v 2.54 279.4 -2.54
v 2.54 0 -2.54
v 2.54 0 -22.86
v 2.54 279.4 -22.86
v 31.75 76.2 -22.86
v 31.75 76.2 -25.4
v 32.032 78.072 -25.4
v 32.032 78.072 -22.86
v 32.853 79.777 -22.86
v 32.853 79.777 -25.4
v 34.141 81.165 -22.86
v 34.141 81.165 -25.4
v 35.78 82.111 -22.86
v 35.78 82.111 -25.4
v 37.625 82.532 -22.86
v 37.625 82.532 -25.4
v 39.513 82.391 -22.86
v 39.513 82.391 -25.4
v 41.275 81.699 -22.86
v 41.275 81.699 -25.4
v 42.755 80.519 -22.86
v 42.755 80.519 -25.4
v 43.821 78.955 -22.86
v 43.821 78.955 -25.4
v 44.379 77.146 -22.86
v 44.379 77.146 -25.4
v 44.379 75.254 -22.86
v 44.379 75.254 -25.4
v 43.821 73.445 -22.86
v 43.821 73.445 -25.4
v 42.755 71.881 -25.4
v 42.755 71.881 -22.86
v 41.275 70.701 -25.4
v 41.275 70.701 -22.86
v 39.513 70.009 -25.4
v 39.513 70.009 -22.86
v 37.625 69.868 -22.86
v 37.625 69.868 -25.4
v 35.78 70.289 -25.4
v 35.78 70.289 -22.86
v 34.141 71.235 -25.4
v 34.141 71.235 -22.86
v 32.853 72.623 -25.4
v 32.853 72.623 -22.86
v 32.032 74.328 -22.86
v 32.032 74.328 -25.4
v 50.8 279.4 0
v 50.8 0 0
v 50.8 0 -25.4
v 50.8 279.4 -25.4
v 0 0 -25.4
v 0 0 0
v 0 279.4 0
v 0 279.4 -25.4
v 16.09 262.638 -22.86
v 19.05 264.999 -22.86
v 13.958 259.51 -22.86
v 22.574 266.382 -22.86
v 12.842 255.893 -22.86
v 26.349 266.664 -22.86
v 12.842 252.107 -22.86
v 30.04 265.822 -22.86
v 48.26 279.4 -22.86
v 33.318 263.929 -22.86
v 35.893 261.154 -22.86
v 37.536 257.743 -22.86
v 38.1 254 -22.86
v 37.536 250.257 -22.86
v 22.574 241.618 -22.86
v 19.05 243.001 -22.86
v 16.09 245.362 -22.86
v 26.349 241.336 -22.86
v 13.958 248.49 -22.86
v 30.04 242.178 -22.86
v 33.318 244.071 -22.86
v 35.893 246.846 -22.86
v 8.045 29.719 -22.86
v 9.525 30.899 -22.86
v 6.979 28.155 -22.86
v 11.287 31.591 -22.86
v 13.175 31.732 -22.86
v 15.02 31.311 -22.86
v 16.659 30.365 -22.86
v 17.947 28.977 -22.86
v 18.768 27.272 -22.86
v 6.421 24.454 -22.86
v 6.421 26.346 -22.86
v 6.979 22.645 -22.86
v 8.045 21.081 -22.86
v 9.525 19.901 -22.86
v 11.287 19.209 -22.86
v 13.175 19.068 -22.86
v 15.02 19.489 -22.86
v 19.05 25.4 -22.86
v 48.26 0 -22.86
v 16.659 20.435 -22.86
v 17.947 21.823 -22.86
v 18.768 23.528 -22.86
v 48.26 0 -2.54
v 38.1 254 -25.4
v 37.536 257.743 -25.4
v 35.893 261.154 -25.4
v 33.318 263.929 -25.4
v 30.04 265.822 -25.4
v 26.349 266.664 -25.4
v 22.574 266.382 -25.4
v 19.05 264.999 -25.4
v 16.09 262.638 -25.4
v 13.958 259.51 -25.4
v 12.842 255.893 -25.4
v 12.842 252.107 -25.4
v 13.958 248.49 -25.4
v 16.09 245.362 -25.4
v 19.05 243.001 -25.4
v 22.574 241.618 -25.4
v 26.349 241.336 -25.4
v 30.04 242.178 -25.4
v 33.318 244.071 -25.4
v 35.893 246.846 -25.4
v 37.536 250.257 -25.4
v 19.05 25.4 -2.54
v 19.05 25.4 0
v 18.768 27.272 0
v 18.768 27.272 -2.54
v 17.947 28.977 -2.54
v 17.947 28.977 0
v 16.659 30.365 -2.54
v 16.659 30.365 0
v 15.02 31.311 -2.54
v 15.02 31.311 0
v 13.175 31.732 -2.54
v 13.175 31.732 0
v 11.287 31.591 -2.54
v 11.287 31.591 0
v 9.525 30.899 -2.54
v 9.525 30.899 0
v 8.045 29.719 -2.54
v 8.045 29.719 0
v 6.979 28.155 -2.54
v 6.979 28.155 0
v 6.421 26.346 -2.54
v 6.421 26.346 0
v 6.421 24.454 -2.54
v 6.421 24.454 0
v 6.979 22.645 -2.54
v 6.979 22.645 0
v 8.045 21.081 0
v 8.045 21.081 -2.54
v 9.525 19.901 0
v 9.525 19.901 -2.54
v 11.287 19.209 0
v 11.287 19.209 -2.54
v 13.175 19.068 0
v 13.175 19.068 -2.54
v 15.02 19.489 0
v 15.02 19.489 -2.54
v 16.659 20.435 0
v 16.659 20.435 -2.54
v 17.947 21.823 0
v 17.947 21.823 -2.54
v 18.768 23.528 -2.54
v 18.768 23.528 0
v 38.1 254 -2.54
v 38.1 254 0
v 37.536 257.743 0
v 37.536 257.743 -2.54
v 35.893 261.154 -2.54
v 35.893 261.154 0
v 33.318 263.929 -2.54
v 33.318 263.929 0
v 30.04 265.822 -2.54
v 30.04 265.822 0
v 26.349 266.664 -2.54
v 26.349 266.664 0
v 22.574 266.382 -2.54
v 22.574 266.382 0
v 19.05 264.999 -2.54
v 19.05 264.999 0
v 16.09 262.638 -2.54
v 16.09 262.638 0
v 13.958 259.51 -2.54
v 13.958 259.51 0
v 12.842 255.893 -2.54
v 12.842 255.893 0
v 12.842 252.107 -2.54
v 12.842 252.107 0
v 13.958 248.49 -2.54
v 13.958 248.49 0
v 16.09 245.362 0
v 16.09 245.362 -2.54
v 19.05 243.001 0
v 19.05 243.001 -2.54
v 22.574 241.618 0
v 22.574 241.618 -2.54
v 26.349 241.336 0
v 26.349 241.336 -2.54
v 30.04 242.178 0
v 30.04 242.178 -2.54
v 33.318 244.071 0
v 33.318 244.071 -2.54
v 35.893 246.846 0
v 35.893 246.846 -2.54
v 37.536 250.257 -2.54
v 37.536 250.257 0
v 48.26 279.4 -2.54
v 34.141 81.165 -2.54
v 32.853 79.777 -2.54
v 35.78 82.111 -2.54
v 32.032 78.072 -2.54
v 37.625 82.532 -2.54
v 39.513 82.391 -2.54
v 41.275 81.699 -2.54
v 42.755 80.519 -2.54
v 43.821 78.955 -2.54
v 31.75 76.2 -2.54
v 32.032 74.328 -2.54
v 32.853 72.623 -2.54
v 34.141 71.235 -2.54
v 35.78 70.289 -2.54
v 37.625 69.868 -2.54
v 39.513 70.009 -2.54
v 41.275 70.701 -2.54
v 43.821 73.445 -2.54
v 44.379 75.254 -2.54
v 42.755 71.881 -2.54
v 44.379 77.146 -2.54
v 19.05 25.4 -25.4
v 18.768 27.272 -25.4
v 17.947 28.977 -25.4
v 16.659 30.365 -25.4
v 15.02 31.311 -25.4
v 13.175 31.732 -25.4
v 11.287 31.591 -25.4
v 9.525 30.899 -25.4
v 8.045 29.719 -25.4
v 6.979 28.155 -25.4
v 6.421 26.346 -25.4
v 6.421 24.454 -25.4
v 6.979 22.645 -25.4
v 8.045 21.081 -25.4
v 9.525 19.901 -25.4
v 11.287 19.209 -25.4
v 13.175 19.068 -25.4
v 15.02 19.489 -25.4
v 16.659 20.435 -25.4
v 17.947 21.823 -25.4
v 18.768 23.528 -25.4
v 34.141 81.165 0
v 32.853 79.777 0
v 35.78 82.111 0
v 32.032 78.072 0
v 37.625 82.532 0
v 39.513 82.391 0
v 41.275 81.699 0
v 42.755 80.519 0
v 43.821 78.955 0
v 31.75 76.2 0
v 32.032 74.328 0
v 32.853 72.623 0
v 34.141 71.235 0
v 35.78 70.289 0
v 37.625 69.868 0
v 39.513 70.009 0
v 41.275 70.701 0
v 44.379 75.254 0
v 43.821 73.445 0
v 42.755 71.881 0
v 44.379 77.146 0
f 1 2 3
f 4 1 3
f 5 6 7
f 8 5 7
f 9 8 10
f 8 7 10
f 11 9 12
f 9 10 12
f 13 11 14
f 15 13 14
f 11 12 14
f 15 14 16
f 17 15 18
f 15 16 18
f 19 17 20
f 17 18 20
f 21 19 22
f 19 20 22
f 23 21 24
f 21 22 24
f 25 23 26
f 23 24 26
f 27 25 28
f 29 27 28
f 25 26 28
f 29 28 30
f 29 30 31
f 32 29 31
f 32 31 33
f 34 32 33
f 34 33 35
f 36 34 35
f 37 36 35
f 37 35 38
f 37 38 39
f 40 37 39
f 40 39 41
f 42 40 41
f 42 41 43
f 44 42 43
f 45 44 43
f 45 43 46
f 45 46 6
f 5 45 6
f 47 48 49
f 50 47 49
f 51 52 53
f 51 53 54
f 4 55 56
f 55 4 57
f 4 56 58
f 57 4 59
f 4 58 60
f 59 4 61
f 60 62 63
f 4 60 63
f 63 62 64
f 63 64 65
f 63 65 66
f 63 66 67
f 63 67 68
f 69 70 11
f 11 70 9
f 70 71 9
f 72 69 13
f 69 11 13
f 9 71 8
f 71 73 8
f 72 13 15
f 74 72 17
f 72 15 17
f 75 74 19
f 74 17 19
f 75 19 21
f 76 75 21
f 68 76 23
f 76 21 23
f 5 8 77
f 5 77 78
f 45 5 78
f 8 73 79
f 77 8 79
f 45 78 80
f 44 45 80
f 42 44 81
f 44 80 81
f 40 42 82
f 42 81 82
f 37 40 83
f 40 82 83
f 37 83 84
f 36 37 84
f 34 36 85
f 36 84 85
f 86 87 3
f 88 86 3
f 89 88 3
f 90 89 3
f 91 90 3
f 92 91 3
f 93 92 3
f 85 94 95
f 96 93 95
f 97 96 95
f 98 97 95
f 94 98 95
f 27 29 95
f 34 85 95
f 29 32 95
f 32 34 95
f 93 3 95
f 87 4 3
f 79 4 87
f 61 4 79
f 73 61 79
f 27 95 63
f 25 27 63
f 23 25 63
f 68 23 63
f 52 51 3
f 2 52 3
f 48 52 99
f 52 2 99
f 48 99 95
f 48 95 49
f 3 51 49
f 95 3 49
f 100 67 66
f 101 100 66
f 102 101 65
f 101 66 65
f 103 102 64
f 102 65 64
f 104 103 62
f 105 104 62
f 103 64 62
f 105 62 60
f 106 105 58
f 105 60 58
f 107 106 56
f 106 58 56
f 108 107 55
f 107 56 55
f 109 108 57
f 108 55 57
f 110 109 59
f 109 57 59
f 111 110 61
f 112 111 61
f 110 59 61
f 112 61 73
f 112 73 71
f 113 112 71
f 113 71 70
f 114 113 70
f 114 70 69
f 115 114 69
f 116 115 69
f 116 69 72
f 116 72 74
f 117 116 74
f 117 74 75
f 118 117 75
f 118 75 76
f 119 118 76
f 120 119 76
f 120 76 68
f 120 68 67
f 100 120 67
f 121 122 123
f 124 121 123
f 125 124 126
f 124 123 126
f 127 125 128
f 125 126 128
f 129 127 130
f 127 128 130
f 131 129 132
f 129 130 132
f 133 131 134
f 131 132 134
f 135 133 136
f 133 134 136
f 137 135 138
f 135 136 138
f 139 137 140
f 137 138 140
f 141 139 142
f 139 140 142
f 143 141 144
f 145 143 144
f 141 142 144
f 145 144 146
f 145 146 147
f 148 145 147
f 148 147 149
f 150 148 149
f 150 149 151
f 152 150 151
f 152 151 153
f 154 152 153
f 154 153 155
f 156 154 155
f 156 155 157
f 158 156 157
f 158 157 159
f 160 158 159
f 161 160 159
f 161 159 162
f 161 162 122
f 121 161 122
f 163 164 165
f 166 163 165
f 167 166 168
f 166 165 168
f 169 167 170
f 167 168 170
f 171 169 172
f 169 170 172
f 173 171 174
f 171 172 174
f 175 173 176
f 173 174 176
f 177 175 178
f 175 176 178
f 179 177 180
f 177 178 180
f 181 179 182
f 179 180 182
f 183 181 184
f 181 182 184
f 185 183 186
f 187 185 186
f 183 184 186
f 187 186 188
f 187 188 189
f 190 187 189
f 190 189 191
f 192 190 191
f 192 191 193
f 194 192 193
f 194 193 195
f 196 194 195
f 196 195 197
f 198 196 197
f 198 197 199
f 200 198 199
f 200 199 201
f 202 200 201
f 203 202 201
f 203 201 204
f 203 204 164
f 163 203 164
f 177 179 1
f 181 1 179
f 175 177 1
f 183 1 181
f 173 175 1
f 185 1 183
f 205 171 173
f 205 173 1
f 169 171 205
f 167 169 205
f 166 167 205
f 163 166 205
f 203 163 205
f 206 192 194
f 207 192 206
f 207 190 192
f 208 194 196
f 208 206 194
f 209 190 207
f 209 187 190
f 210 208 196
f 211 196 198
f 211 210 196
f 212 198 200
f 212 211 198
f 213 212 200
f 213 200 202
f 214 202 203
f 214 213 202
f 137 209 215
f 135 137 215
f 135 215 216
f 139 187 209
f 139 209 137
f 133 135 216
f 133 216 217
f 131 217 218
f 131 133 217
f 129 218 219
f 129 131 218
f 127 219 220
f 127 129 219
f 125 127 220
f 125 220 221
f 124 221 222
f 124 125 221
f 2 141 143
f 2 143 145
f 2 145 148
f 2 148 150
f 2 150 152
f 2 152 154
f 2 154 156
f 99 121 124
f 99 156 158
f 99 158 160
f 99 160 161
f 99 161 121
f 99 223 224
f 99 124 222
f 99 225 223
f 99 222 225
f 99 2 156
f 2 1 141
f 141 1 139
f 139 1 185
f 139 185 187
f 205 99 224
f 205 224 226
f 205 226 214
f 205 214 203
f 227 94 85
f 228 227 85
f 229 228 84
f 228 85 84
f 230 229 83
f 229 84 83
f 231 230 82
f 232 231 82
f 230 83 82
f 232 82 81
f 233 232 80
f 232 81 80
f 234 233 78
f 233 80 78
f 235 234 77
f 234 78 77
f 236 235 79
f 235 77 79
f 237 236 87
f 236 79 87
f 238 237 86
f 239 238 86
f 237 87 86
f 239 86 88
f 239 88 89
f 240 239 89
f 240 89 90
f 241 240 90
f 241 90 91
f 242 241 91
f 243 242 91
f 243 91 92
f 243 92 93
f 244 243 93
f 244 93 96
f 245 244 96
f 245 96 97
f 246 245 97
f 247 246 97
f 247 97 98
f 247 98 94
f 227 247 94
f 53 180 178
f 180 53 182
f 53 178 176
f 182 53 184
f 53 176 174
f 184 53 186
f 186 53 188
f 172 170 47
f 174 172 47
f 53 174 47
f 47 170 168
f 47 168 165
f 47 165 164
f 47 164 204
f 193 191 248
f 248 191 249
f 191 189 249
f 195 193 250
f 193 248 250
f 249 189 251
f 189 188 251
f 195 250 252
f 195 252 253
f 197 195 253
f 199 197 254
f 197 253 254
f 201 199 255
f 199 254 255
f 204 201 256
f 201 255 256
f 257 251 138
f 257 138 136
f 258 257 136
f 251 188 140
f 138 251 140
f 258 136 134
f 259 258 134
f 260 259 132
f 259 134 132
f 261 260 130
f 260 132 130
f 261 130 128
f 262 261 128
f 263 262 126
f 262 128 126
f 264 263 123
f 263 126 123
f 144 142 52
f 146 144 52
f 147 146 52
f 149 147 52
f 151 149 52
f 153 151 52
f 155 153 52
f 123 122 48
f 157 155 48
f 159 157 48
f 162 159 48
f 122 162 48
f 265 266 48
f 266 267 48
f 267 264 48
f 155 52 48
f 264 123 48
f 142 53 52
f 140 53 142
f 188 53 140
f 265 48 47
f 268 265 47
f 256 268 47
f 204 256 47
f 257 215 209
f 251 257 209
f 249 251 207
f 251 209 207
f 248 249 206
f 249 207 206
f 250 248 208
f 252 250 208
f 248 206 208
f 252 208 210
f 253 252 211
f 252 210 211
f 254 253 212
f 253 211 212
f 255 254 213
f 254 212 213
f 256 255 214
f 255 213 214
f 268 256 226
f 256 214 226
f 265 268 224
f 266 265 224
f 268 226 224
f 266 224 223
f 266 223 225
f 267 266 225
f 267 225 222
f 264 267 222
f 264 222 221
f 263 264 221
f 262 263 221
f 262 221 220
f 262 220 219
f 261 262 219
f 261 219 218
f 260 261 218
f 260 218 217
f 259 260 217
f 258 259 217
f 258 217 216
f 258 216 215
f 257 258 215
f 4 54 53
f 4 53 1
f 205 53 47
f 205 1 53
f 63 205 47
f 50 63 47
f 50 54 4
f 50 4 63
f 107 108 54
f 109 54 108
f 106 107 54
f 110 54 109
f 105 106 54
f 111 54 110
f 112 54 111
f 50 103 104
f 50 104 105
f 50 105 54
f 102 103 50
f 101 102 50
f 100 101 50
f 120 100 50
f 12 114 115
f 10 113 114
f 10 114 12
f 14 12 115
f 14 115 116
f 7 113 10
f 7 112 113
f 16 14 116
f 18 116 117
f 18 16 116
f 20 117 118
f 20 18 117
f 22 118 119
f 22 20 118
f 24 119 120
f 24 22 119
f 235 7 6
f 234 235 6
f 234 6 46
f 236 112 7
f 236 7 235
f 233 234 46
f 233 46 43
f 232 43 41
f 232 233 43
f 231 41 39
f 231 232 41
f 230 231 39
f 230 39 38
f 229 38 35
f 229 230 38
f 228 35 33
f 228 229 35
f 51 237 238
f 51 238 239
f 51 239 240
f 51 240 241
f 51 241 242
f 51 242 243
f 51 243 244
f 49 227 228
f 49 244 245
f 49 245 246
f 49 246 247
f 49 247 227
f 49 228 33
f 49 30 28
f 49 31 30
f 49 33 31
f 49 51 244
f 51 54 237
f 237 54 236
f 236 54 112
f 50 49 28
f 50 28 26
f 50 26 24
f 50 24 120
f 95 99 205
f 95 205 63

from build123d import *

# Parameters (mm, degrees)
SKETCH1_W           = 50.8
SKETCH1_H           = 25.4
SKETCH1_W_2         = 45.72
SKETCH1_H_2         = 20.32
BOSS_EXTRUDE1_DEPTH = 279.4
SKETCH2_R           = 6.35
SKETCH2_R_2         = 12.7
CUT_EXTRUDE1_DEPTH  = 286.114292872
SKETCH3_R           = 6.35
CUT_EXTRUDE2_DEPTH  = 286.114292872


with BuildPart() as part:
    # Sketch1 → Boss-Extrude1 (new body)
    with BuildSketch(Plane(origin=(0, 0, 0), x_dir=(1, 0, 0), z_dir=(0, 1, 0))):
        with Locations((25.4, 12.7)):
            Rectangle(SKETCH1_W, SKETCH1_H)
        with Locations((25.4, 12.7)):
            Rectangle(SKETCH1_W_2, SKETCH1_H_2, mode=Mode.SUBTRACT)
    extrude(amount=BOSS_EXTRUDE1_DEPTH)

    # Sketch2 → Cut-Extrude1 (cut, through all)
    with BuildSketch(Plane.XY):
        with Locations((12.7, 25.4)):
            Circle(SKETCH2_R)
        with Locations((25.4, 254)):
            Circle(SKETCH2_R_2)
    extrude(amount=-CUT_EXTRUDE1_DEPTH, mode=Mode.SUBTRACT)

    # Sketch3 → Cut-Extrude2 (cut, through all)
    with BuildSketch(Plane(origin=(0, 0, -25.4), x_dir=(-1, 0, 0), z_dir=(0, 0, -1))):
        with Locations((-38.1, 76.2)):
            Circle(SKETCH3_R)
    extrude(amount=-CUT_EXTRUDE2_DEPTH, mode=Mode.SUBTRACT)


solid = part.part
